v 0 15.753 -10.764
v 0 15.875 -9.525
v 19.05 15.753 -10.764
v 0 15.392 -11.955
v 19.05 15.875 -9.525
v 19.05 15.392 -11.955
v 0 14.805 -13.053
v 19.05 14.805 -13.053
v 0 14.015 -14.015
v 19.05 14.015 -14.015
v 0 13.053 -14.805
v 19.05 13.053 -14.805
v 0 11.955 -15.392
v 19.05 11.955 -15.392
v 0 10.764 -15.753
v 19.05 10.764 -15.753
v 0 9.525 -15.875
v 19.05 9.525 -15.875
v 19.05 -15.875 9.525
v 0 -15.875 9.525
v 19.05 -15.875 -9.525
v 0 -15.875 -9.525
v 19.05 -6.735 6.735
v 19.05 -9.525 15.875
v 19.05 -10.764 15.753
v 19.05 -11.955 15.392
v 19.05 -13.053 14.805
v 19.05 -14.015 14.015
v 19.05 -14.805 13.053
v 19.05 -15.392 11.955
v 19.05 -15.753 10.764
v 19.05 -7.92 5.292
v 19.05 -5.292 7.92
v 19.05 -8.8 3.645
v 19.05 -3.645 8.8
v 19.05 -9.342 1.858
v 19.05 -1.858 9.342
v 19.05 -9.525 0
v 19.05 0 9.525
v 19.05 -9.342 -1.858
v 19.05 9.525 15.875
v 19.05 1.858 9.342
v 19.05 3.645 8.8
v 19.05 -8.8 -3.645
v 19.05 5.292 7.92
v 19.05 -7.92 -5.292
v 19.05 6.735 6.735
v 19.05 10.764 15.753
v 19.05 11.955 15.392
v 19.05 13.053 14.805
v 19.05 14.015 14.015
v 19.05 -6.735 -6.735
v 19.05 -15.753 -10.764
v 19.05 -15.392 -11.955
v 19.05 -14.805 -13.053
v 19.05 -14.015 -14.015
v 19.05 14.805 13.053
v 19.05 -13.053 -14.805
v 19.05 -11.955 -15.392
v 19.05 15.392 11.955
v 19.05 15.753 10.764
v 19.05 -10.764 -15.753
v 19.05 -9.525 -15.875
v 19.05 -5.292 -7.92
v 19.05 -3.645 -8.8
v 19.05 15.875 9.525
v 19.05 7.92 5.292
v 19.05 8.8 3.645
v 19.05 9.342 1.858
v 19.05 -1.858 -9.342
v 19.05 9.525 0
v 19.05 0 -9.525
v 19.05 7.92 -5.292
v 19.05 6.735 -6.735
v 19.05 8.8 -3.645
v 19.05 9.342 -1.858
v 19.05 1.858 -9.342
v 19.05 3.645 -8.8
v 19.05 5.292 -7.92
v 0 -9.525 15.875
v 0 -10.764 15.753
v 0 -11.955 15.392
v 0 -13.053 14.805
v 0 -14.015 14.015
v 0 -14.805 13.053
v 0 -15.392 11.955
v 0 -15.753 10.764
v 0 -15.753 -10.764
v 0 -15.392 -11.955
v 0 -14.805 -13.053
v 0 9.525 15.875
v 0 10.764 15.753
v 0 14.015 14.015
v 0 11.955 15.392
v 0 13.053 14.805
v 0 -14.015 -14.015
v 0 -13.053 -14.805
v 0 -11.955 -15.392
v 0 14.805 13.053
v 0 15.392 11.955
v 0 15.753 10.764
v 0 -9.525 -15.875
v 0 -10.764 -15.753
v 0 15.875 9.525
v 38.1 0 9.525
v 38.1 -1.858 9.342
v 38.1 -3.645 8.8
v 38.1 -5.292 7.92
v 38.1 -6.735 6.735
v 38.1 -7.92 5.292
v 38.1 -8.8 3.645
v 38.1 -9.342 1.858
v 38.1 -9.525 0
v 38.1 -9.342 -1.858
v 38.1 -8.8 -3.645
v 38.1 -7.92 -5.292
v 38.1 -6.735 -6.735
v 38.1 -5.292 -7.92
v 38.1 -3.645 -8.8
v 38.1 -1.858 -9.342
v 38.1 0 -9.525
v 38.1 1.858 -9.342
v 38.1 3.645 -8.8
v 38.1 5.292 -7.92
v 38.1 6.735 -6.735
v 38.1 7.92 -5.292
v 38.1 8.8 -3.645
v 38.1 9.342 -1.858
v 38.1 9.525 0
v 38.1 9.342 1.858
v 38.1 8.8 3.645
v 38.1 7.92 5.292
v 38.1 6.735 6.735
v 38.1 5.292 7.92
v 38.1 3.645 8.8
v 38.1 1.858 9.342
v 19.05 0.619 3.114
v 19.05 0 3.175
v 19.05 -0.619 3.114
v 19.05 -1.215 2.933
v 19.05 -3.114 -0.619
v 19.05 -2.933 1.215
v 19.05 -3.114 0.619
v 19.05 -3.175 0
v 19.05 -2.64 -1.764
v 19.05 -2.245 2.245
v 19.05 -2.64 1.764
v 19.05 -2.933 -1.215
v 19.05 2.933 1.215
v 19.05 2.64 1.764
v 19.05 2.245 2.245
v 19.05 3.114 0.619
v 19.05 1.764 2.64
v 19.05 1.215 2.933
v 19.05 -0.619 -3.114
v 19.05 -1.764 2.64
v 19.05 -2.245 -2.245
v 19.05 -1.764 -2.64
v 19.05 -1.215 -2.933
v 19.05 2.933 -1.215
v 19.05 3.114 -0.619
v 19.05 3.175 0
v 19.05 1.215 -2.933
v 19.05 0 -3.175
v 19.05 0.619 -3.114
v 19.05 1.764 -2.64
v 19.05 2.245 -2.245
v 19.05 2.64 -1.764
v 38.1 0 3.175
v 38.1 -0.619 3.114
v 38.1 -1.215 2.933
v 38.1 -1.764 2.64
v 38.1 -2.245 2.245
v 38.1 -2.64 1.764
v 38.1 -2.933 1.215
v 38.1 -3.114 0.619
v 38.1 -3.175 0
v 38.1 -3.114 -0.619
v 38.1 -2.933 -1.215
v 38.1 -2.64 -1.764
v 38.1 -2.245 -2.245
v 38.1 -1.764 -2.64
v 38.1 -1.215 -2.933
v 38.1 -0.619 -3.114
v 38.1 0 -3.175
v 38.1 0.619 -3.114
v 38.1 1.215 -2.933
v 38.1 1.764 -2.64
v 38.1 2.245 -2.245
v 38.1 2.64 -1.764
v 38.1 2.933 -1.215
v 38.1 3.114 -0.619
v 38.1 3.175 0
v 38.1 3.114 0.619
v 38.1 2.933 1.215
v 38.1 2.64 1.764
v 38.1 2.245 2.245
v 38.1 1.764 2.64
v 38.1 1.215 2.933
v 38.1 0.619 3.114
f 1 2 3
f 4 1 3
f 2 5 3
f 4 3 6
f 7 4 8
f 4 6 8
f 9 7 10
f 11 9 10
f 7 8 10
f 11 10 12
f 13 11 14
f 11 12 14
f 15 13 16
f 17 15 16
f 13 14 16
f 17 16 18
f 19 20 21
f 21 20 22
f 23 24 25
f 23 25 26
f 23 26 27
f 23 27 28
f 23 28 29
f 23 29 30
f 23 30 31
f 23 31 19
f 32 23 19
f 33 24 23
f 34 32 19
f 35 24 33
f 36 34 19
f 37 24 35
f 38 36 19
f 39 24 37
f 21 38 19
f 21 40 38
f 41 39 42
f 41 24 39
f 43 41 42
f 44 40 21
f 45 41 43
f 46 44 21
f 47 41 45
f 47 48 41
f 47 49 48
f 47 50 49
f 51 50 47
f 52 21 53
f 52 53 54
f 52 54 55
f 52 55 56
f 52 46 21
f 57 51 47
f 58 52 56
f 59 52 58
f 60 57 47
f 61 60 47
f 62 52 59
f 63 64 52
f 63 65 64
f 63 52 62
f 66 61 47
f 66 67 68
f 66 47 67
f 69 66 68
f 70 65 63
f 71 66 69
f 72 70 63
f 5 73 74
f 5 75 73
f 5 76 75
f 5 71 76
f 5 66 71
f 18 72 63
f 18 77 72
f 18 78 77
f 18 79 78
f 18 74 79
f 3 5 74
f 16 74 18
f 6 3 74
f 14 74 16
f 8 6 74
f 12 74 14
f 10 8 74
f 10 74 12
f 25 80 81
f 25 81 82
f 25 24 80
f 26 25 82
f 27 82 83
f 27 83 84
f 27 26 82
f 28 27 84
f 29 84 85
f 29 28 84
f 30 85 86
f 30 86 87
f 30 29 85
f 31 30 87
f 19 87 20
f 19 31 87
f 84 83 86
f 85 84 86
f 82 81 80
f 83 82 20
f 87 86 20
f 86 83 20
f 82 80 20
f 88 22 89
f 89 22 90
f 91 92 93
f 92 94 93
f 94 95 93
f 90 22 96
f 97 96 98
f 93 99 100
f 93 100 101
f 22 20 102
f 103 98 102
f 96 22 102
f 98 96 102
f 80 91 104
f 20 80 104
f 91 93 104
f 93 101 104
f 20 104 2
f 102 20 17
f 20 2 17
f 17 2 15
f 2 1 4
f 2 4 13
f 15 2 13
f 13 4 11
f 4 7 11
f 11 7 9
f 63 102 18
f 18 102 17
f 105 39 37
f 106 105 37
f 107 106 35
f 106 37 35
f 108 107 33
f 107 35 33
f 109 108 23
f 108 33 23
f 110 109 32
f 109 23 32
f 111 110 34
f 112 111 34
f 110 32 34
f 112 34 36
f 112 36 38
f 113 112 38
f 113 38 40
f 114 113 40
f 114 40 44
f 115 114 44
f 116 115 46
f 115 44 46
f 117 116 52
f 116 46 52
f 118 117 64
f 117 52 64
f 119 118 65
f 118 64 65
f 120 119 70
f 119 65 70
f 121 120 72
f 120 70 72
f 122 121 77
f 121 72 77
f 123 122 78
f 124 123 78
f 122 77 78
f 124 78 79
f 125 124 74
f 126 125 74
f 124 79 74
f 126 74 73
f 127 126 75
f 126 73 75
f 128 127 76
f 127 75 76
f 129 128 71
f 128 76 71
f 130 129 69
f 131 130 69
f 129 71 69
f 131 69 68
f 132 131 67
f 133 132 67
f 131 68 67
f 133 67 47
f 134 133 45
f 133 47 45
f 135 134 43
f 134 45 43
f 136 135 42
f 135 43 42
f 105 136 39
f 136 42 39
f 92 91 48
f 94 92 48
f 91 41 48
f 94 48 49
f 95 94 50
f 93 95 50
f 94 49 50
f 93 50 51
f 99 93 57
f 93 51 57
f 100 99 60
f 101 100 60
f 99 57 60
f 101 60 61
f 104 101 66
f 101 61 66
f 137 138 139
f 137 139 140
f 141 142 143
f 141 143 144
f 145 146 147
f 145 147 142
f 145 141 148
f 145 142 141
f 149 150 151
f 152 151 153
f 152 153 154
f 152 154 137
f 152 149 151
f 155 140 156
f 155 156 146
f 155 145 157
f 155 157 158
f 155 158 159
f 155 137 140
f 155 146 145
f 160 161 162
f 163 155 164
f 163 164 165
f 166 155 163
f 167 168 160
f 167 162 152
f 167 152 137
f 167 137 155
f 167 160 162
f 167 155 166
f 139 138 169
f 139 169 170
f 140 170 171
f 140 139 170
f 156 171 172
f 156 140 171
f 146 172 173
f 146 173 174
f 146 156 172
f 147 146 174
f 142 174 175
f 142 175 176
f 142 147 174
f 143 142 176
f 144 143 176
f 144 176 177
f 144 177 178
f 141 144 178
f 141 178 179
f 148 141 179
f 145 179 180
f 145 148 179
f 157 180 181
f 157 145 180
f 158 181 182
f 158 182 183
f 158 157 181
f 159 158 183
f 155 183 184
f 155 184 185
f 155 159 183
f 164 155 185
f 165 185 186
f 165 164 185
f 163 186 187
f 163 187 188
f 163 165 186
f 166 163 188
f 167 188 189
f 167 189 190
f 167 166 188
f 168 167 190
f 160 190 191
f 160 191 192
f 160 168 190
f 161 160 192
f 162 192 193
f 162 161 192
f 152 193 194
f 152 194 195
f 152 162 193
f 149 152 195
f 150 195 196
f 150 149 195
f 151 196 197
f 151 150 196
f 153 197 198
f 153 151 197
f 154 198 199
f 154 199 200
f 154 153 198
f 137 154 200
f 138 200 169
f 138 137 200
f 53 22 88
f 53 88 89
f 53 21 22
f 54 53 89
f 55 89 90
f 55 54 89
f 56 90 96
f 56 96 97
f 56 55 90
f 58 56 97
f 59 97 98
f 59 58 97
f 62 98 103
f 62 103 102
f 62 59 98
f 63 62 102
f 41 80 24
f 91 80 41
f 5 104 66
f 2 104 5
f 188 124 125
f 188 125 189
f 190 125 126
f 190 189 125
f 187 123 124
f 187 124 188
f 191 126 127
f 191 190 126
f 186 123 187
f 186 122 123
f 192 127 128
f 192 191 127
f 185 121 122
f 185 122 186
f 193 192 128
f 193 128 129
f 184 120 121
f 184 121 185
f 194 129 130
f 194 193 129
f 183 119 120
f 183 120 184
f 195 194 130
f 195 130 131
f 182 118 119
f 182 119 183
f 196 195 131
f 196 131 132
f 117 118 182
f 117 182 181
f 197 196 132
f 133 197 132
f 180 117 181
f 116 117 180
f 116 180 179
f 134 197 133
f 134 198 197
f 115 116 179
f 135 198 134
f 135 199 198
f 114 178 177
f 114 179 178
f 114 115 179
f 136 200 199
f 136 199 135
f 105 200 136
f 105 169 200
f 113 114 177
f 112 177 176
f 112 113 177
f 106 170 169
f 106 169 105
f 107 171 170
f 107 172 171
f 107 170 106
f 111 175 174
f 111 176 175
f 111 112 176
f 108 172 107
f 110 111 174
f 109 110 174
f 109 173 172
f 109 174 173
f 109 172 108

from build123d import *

# Parameters (mm, degrees)
SKETCH1_W           = 31.75
SKETCH1_H           = 31.75
BOSS_EXTRUDE1_DEPTH = 19.05
SKETCH2_R           = 9.525
SKETCH2_R_2         = 3.175
BOSS_EXTRUDE2_DEPTH = 19.05
FILLET1_R           = 6.35


with BuildPart() as part:
    # Sketch1 → Boss-Extrude1 (new body)
    with BuildSketch(Plane(origin=(0, 0, 0), x_dir=(0, 0, -1), z_dir=(1, 0, 0))):
        Rectangle(SKETCH1_W, SKETCH1_H)
    extrude(amount=BOSS_EXTRUDE1_DEPTH)

    # Sketch2 → Boss-Extrude2 (add)
    with BuildSketch(Plane(origin=(19.05, 0, 0), x_dir=(0, 0, -1), z_dir=(1, 0, 0))):
        with Locations(Location((0, 0, 0), (0, 0, 180))):
            Circle(SKETCH2_R)
        with Locations(Location((0, 0, 0), (0, 0, 180))):
            Circle(SKETCH2_R_2, mode=Mode.SUBTRACT)
    extrude(amount=BOSS_EXTRUDE2_DEPTH)

    # Fillet1
    fillet1_edges = [part.edges().sort_by_distance(p)[0] for p in [
        (9.525, -15.875, -15.875),
        (9.525, -15.875, 15.875),
        (9.525, 15.875, 15.875),
        (9.525, 15.875, -15.875),
    ]]
    fillet(fillet1_edges, radius=FILLET1_R)


solid = part.part
